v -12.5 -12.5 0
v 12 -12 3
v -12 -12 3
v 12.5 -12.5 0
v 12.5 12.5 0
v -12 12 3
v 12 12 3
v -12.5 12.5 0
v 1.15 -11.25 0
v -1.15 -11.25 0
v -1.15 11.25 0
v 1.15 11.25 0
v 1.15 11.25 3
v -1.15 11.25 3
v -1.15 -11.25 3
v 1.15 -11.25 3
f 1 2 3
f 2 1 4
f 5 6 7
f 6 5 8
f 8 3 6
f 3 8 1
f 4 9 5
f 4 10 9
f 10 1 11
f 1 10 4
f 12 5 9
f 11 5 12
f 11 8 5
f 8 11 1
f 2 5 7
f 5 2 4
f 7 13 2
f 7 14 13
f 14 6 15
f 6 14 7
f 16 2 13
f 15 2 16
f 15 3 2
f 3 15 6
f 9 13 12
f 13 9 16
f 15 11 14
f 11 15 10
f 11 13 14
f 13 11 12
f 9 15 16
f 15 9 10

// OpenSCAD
// Ultimate Parametric Base Generator and Customizer Script
// developed by Daniel Joyce
// Creative Commons Share Alike + Attribution
// Please see LICENSE.md
// 3D-Miniatures.com

/* [Base] */

// Polygon
base_style = 4; // [3:triangle,4:square,5:pentagon,6:hexagon,7:heptagon,8:octagon,50:round]

// Base diameter,
diameter = 25; // [15:250]

// Thickness of base, ~3 mm is standard:
thickness = 3; // [1:25]

// Stretch base along x-axis
stretch_perc = 0; // [0:400]

/* [Slot or Stand] */

// Should base have a slot or stand?
slot = 1; // [0:Neither, 1:Slot, 2:Stand]

// Orientation of base
base_orientation = 1; // [1:style 1, 2:style 2]

// Orientation of slot
slot_orientation = 1; // [1:x axis, 2:y axis]

// Normally 25 mm square / hex base diameter is measured side to side:
across_sides = 1; // [0:no, 1:yes]

// Stand height in mm from ground, does not include peg length
stand_height = 28; // [10:112]

// Diameter of peg in tenths of mm
peg_diameter = 10; // [10:100]

// Length of peg in mm
peg_height = 5; // [2:10]

/* [Texture] */

// File for surface texture
texture_filename = "texture.dat"; // [image_surface:100x100]

// How much to scale the texture vertically, 10 = no scaling
texture_scale = 10; // [1:50]

// How much the texture is moved up/down the top of the base
panel_offset = 0; // [-20:20]

/* [Hidden] */

radius = diameter / 2;

cos_r = cos(360/(2*base_style));

scale_factor = across_sides == 0 ? 1 : 1 / cos_r;

offset = (diameter * scale_factor) + 2;

stretch_x = stretch_perc / 100;

module texture(diameter, texture_scale) {
  scale_factor = (diameter+0.5)/100;
  scale([scale_factor,scale_factor,texture_scale]) {
    surface(file=texture_filename, center=true);
  }
}


module texture_panel(sides, diameter, texture_scale){
  radius = diameter/2;
  intersection(){
    cylinder(h=20,r=radius, $fn=sides);
    translate([0,0,1]) texture(diameter, texture_scale);
  }
}

module stand(stand_height, peg_height, peg_diam) {
  peg_r = peg_diam / 2;
  stand_r2 = peg_r +.5;
  stand_r1 = peg_r +1;
  union(){
    // peg
    cylinder(r1=peg_r, r2=peg_r,h=stand_height+peg_height, $fn=50);
    cylinder(r1=stand_r1, r2=stand_r2, h=stand_height - 0.01, $fn=50);
  }
}


module base(sides,
  diameter = 25,
  slot = false,
  stand = false,
  height = 3.33,
  base_x = true,
  slot_x = true,
  stand_height = 40,
  peg_height = 4,
  peg_diameter = 2,
  inset = false,
  texture_scale = 1.0,
  panel_offset = -0.4){
  radius = diameter / 2;
  cos_r = cos(360/(2*sides));
  scale_factor = inset ? 1 : 1 / cos_r;
  slot_width = cos_r*diameter*0.9*scale_factor;
  slot_angle = slot_x ? 0 : 90;
  even = sides % 2 == 0;
  base_angle = even ? 360 / (2*sides) : 90;
  base_r = base_x ? 0 : base_angle;
  top_radius = radius - 0.5;
  difference(){
    union(){
      if(stand){
        translate([0,0,0.5]){
          stand(stand_height-0.5, peg_height, peg_diameter);
        }
      }
      scale([scale_factor + stretch_x, scale_factor,1]) rotate([0,0,360/(2*sides)]) {
        rotate([0,0, base_r]) cylinder(h = height, r1=radius, r2=top_radius, $fn=sides);
        translate([0,0,height-1+panel_offset]){
          texture_panel(sides=sides,
                    diameter=diameter-1,
                    texture_scale=texture_scale);
        }
      }
    }
    if(slot){
      rotate([0,0,slot_angle]) cube([2.3,slot_width,height+10], center=true);
    }
  }
}


base(base_style,
    diameter = diameter,
    slot = (slot == 1),
    stand = (slot == 2),
    height = thickness,
    inset = (across_sides == 0),
    stand_height = stand_height,
    peg_height = peg_height,
    peg_diameter = peg_diameter/10,
    base_x = (base_orientation == 1),
    slot_x = (slot_orientation == 1),
    panel_offset = panel_offset/10,
    texture_scale = texture_scale/10);
